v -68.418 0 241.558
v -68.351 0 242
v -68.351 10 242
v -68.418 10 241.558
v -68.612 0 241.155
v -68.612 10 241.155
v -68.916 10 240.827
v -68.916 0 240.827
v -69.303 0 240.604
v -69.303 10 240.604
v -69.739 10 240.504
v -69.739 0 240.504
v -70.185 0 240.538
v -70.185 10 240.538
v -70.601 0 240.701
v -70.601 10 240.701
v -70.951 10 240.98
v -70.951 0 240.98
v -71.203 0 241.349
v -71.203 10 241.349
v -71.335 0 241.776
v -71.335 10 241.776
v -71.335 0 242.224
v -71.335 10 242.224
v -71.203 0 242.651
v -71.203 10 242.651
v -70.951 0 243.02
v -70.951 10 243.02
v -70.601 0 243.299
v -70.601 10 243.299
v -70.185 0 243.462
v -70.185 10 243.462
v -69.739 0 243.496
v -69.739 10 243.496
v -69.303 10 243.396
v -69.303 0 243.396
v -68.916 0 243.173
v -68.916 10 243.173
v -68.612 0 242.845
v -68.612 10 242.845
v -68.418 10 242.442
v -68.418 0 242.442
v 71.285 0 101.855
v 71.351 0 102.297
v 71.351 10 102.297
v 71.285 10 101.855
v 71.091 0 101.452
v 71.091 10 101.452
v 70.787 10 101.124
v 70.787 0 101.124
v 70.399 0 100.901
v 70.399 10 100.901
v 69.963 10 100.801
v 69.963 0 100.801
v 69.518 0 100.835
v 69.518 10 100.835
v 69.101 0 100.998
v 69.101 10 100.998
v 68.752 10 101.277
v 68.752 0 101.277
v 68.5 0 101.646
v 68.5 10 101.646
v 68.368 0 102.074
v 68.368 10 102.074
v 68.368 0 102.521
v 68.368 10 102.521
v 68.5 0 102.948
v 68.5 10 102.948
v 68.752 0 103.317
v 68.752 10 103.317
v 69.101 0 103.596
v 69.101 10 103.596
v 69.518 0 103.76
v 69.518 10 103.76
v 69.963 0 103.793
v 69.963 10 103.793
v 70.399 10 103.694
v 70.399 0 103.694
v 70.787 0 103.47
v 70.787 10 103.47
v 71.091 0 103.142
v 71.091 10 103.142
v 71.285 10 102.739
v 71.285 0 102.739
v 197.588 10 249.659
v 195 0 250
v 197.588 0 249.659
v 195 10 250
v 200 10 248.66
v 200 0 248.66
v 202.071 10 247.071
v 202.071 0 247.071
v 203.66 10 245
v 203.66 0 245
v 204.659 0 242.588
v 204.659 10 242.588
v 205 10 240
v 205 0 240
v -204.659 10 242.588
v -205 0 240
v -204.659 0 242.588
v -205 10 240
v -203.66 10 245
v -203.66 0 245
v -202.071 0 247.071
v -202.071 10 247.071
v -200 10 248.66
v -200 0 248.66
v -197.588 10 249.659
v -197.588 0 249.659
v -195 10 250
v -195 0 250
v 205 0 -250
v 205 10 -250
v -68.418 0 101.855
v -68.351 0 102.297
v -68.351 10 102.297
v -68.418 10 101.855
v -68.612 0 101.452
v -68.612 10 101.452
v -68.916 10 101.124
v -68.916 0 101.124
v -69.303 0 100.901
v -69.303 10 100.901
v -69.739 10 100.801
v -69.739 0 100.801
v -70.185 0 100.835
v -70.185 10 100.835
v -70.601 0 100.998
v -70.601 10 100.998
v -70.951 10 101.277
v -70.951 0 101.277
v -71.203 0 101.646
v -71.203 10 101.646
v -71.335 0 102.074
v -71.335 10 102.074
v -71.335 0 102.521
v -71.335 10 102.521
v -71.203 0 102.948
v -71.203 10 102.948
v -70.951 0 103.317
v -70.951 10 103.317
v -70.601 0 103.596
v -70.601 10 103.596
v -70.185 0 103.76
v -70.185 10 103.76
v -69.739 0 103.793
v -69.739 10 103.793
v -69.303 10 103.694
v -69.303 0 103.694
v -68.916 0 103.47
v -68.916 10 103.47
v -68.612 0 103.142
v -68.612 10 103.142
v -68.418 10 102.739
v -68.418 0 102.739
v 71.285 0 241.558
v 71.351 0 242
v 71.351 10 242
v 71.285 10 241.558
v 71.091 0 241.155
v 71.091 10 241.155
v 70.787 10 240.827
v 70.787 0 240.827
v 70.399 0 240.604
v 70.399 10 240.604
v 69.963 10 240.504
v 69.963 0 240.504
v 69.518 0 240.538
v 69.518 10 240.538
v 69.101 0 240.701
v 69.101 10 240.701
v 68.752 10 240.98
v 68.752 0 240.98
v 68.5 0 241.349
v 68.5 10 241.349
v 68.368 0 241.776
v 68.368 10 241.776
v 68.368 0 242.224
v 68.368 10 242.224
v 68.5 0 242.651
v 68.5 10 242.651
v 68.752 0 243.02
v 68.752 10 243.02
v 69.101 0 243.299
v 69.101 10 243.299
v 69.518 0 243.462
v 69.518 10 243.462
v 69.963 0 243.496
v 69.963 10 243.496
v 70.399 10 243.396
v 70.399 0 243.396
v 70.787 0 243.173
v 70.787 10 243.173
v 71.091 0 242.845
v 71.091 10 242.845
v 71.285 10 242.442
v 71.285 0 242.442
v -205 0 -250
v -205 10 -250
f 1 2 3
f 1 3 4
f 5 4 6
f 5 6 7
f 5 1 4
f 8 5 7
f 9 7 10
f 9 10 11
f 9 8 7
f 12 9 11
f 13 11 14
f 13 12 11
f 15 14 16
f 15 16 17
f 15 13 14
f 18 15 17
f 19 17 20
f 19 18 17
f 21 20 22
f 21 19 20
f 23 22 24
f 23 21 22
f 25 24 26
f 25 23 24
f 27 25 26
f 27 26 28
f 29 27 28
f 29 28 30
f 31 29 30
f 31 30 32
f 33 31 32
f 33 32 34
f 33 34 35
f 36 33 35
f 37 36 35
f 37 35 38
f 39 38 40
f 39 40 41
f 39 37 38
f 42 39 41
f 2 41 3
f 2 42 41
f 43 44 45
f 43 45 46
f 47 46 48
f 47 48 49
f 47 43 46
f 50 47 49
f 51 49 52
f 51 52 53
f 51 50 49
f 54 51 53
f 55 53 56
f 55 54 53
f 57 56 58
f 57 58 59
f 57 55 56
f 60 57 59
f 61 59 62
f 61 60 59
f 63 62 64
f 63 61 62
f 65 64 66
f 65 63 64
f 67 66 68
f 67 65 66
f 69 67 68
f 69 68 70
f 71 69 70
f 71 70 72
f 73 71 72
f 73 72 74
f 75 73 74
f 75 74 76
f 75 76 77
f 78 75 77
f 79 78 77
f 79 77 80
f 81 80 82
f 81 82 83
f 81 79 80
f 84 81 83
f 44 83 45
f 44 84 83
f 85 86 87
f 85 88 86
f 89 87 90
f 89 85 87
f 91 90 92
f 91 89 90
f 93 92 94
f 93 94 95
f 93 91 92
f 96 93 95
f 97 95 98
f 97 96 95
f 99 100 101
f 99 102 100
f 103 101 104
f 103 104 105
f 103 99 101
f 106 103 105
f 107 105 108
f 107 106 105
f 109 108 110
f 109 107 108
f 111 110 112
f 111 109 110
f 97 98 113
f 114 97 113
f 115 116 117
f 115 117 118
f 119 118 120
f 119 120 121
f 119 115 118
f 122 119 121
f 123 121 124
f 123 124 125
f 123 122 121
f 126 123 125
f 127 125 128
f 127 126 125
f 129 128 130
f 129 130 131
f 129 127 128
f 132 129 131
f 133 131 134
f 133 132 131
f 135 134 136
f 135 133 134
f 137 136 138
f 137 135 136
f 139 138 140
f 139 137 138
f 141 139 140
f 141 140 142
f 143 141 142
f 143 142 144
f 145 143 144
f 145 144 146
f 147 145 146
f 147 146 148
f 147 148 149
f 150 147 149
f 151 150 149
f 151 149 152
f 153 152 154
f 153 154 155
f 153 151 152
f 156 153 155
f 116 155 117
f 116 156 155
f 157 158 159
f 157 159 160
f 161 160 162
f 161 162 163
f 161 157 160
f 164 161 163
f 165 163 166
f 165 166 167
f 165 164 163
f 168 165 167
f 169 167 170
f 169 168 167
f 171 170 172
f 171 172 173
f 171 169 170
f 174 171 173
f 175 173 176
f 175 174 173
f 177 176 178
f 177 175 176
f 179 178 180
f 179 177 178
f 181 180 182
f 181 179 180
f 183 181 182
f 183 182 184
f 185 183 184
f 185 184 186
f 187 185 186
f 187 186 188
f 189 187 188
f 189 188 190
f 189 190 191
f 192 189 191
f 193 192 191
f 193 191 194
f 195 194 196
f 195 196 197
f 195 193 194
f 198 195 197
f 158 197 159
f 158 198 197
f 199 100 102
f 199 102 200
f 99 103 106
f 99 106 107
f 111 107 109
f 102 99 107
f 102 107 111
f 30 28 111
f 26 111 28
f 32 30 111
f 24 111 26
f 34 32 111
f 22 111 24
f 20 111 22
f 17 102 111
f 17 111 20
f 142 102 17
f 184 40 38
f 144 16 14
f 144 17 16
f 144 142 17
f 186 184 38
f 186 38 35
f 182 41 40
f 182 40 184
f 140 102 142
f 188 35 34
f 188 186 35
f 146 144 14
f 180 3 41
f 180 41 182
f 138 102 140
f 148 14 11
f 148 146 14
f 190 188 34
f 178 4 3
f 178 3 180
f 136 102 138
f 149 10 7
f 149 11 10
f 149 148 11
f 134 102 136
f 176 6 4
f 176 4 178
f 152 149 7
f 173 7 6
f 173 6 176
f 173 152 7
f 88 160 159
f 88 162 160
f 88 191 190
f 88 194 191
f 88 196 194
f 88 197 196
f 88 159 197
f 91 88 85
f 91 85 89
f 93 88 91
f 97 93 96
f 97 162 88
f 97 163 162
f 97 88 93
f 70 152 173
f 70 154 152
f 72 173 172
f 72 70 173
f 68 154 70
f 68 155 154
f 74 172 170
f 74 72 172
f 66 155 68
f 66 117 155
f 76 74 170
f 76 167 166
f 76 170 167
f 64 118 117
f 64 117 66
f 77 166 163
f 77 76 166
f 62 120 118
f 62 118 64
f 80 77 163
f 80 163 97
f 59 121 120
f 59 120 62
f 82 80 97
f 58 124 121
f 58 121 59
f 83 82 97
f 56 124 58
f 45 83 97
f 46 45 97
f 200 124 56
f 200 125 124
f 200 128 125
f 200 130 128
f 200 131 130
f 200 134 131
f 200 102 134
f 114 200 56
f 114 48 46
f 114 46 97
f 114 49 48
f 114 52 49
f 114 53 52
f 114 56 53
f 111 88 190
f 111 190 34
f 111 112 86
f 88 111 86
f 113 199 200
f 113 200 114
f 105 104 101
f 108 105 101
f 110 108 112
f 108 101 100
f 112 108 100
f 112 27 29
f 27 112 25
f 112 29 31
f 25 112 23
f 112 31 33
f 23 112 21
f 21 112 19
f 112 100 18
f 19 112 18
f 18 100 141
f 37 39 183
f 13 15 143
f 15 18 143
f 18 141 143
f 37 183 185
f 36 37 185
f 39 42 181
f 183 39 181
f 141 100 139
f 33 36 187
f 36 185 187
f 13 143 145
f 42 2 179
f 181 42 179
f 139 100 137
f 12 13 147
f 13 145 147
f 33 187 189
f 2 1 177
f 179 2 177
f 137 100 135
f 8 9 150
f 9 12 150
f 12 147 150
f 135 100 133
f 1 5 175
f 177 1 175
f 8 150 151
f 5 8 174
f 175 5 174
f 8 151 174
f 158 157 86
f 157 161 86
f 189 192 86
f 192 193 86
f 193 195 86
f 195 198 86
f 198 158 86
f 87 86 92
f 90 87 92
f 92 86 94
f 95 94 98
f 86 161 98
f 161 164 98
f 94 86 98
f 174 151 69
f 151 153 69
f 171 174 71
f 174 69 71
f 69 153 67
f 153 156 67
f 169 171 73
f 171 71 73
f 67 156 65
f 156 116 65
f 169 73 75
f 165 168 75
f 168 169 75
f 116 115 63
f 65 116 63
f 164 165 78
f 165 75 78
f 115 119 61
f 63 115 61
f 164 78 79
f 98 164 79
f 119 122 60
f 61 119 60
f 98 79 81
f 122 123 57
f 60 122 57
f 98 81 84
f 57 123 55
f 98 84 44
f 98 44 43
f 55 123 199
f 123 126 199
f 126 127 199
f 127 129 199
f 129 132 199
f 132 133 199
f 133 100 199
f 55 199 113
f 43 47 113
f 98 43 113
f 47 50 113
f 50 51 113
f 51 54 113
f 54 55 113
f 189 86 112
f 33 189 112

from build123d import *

# Parameters (mm, degrees)
SKETCH1_W           = 410
SKETCH1_H           = 500
SKETCH1_R           = 1.5
BOSS_EXTRUDE1_DEPTH = 10
FILLET1_R           = 10


with BuildPart() as part:
    # Sketch1 → Boss-Extrude1 (new body)
    with BuildSketch(Plane(origin=(0, 0, 0), x_dir=(1, 0, 0), z_dir=(0, 1, 0))):
        Rectangle(SKETCH1_W, SKETCH1_H)
        with Locations((-69.851403599, -242)):
            Circle(SKETCH1_R, mode=Mode.SUBTRACT)
        with Locations((-69.851403599, -102.297192802)):
            Circle(SKETCH1_R, mode=Mode.SUBTRACT)
        with Locations((69.851403599, -102.297192802)):
            Circle(SKETCH1_R, mode=Mode.SUBTRACT)
        with Locations((69.851403599, -242)):
            Circle(SKETCH1_R, mode=Mode.SUBTRACT)
    extrude(amount=BOSS_EXTRUDE1_DEPTH)

    # Fillet1
    fillet1_edges = [part.edges().sort_by_distance(p)[0] for p in [
        (205, 5, 250),
        (-205, 5, 250),
    ]]
    fillet(fillet1_edges, radius=FILLET1_R)


solid = part.part
